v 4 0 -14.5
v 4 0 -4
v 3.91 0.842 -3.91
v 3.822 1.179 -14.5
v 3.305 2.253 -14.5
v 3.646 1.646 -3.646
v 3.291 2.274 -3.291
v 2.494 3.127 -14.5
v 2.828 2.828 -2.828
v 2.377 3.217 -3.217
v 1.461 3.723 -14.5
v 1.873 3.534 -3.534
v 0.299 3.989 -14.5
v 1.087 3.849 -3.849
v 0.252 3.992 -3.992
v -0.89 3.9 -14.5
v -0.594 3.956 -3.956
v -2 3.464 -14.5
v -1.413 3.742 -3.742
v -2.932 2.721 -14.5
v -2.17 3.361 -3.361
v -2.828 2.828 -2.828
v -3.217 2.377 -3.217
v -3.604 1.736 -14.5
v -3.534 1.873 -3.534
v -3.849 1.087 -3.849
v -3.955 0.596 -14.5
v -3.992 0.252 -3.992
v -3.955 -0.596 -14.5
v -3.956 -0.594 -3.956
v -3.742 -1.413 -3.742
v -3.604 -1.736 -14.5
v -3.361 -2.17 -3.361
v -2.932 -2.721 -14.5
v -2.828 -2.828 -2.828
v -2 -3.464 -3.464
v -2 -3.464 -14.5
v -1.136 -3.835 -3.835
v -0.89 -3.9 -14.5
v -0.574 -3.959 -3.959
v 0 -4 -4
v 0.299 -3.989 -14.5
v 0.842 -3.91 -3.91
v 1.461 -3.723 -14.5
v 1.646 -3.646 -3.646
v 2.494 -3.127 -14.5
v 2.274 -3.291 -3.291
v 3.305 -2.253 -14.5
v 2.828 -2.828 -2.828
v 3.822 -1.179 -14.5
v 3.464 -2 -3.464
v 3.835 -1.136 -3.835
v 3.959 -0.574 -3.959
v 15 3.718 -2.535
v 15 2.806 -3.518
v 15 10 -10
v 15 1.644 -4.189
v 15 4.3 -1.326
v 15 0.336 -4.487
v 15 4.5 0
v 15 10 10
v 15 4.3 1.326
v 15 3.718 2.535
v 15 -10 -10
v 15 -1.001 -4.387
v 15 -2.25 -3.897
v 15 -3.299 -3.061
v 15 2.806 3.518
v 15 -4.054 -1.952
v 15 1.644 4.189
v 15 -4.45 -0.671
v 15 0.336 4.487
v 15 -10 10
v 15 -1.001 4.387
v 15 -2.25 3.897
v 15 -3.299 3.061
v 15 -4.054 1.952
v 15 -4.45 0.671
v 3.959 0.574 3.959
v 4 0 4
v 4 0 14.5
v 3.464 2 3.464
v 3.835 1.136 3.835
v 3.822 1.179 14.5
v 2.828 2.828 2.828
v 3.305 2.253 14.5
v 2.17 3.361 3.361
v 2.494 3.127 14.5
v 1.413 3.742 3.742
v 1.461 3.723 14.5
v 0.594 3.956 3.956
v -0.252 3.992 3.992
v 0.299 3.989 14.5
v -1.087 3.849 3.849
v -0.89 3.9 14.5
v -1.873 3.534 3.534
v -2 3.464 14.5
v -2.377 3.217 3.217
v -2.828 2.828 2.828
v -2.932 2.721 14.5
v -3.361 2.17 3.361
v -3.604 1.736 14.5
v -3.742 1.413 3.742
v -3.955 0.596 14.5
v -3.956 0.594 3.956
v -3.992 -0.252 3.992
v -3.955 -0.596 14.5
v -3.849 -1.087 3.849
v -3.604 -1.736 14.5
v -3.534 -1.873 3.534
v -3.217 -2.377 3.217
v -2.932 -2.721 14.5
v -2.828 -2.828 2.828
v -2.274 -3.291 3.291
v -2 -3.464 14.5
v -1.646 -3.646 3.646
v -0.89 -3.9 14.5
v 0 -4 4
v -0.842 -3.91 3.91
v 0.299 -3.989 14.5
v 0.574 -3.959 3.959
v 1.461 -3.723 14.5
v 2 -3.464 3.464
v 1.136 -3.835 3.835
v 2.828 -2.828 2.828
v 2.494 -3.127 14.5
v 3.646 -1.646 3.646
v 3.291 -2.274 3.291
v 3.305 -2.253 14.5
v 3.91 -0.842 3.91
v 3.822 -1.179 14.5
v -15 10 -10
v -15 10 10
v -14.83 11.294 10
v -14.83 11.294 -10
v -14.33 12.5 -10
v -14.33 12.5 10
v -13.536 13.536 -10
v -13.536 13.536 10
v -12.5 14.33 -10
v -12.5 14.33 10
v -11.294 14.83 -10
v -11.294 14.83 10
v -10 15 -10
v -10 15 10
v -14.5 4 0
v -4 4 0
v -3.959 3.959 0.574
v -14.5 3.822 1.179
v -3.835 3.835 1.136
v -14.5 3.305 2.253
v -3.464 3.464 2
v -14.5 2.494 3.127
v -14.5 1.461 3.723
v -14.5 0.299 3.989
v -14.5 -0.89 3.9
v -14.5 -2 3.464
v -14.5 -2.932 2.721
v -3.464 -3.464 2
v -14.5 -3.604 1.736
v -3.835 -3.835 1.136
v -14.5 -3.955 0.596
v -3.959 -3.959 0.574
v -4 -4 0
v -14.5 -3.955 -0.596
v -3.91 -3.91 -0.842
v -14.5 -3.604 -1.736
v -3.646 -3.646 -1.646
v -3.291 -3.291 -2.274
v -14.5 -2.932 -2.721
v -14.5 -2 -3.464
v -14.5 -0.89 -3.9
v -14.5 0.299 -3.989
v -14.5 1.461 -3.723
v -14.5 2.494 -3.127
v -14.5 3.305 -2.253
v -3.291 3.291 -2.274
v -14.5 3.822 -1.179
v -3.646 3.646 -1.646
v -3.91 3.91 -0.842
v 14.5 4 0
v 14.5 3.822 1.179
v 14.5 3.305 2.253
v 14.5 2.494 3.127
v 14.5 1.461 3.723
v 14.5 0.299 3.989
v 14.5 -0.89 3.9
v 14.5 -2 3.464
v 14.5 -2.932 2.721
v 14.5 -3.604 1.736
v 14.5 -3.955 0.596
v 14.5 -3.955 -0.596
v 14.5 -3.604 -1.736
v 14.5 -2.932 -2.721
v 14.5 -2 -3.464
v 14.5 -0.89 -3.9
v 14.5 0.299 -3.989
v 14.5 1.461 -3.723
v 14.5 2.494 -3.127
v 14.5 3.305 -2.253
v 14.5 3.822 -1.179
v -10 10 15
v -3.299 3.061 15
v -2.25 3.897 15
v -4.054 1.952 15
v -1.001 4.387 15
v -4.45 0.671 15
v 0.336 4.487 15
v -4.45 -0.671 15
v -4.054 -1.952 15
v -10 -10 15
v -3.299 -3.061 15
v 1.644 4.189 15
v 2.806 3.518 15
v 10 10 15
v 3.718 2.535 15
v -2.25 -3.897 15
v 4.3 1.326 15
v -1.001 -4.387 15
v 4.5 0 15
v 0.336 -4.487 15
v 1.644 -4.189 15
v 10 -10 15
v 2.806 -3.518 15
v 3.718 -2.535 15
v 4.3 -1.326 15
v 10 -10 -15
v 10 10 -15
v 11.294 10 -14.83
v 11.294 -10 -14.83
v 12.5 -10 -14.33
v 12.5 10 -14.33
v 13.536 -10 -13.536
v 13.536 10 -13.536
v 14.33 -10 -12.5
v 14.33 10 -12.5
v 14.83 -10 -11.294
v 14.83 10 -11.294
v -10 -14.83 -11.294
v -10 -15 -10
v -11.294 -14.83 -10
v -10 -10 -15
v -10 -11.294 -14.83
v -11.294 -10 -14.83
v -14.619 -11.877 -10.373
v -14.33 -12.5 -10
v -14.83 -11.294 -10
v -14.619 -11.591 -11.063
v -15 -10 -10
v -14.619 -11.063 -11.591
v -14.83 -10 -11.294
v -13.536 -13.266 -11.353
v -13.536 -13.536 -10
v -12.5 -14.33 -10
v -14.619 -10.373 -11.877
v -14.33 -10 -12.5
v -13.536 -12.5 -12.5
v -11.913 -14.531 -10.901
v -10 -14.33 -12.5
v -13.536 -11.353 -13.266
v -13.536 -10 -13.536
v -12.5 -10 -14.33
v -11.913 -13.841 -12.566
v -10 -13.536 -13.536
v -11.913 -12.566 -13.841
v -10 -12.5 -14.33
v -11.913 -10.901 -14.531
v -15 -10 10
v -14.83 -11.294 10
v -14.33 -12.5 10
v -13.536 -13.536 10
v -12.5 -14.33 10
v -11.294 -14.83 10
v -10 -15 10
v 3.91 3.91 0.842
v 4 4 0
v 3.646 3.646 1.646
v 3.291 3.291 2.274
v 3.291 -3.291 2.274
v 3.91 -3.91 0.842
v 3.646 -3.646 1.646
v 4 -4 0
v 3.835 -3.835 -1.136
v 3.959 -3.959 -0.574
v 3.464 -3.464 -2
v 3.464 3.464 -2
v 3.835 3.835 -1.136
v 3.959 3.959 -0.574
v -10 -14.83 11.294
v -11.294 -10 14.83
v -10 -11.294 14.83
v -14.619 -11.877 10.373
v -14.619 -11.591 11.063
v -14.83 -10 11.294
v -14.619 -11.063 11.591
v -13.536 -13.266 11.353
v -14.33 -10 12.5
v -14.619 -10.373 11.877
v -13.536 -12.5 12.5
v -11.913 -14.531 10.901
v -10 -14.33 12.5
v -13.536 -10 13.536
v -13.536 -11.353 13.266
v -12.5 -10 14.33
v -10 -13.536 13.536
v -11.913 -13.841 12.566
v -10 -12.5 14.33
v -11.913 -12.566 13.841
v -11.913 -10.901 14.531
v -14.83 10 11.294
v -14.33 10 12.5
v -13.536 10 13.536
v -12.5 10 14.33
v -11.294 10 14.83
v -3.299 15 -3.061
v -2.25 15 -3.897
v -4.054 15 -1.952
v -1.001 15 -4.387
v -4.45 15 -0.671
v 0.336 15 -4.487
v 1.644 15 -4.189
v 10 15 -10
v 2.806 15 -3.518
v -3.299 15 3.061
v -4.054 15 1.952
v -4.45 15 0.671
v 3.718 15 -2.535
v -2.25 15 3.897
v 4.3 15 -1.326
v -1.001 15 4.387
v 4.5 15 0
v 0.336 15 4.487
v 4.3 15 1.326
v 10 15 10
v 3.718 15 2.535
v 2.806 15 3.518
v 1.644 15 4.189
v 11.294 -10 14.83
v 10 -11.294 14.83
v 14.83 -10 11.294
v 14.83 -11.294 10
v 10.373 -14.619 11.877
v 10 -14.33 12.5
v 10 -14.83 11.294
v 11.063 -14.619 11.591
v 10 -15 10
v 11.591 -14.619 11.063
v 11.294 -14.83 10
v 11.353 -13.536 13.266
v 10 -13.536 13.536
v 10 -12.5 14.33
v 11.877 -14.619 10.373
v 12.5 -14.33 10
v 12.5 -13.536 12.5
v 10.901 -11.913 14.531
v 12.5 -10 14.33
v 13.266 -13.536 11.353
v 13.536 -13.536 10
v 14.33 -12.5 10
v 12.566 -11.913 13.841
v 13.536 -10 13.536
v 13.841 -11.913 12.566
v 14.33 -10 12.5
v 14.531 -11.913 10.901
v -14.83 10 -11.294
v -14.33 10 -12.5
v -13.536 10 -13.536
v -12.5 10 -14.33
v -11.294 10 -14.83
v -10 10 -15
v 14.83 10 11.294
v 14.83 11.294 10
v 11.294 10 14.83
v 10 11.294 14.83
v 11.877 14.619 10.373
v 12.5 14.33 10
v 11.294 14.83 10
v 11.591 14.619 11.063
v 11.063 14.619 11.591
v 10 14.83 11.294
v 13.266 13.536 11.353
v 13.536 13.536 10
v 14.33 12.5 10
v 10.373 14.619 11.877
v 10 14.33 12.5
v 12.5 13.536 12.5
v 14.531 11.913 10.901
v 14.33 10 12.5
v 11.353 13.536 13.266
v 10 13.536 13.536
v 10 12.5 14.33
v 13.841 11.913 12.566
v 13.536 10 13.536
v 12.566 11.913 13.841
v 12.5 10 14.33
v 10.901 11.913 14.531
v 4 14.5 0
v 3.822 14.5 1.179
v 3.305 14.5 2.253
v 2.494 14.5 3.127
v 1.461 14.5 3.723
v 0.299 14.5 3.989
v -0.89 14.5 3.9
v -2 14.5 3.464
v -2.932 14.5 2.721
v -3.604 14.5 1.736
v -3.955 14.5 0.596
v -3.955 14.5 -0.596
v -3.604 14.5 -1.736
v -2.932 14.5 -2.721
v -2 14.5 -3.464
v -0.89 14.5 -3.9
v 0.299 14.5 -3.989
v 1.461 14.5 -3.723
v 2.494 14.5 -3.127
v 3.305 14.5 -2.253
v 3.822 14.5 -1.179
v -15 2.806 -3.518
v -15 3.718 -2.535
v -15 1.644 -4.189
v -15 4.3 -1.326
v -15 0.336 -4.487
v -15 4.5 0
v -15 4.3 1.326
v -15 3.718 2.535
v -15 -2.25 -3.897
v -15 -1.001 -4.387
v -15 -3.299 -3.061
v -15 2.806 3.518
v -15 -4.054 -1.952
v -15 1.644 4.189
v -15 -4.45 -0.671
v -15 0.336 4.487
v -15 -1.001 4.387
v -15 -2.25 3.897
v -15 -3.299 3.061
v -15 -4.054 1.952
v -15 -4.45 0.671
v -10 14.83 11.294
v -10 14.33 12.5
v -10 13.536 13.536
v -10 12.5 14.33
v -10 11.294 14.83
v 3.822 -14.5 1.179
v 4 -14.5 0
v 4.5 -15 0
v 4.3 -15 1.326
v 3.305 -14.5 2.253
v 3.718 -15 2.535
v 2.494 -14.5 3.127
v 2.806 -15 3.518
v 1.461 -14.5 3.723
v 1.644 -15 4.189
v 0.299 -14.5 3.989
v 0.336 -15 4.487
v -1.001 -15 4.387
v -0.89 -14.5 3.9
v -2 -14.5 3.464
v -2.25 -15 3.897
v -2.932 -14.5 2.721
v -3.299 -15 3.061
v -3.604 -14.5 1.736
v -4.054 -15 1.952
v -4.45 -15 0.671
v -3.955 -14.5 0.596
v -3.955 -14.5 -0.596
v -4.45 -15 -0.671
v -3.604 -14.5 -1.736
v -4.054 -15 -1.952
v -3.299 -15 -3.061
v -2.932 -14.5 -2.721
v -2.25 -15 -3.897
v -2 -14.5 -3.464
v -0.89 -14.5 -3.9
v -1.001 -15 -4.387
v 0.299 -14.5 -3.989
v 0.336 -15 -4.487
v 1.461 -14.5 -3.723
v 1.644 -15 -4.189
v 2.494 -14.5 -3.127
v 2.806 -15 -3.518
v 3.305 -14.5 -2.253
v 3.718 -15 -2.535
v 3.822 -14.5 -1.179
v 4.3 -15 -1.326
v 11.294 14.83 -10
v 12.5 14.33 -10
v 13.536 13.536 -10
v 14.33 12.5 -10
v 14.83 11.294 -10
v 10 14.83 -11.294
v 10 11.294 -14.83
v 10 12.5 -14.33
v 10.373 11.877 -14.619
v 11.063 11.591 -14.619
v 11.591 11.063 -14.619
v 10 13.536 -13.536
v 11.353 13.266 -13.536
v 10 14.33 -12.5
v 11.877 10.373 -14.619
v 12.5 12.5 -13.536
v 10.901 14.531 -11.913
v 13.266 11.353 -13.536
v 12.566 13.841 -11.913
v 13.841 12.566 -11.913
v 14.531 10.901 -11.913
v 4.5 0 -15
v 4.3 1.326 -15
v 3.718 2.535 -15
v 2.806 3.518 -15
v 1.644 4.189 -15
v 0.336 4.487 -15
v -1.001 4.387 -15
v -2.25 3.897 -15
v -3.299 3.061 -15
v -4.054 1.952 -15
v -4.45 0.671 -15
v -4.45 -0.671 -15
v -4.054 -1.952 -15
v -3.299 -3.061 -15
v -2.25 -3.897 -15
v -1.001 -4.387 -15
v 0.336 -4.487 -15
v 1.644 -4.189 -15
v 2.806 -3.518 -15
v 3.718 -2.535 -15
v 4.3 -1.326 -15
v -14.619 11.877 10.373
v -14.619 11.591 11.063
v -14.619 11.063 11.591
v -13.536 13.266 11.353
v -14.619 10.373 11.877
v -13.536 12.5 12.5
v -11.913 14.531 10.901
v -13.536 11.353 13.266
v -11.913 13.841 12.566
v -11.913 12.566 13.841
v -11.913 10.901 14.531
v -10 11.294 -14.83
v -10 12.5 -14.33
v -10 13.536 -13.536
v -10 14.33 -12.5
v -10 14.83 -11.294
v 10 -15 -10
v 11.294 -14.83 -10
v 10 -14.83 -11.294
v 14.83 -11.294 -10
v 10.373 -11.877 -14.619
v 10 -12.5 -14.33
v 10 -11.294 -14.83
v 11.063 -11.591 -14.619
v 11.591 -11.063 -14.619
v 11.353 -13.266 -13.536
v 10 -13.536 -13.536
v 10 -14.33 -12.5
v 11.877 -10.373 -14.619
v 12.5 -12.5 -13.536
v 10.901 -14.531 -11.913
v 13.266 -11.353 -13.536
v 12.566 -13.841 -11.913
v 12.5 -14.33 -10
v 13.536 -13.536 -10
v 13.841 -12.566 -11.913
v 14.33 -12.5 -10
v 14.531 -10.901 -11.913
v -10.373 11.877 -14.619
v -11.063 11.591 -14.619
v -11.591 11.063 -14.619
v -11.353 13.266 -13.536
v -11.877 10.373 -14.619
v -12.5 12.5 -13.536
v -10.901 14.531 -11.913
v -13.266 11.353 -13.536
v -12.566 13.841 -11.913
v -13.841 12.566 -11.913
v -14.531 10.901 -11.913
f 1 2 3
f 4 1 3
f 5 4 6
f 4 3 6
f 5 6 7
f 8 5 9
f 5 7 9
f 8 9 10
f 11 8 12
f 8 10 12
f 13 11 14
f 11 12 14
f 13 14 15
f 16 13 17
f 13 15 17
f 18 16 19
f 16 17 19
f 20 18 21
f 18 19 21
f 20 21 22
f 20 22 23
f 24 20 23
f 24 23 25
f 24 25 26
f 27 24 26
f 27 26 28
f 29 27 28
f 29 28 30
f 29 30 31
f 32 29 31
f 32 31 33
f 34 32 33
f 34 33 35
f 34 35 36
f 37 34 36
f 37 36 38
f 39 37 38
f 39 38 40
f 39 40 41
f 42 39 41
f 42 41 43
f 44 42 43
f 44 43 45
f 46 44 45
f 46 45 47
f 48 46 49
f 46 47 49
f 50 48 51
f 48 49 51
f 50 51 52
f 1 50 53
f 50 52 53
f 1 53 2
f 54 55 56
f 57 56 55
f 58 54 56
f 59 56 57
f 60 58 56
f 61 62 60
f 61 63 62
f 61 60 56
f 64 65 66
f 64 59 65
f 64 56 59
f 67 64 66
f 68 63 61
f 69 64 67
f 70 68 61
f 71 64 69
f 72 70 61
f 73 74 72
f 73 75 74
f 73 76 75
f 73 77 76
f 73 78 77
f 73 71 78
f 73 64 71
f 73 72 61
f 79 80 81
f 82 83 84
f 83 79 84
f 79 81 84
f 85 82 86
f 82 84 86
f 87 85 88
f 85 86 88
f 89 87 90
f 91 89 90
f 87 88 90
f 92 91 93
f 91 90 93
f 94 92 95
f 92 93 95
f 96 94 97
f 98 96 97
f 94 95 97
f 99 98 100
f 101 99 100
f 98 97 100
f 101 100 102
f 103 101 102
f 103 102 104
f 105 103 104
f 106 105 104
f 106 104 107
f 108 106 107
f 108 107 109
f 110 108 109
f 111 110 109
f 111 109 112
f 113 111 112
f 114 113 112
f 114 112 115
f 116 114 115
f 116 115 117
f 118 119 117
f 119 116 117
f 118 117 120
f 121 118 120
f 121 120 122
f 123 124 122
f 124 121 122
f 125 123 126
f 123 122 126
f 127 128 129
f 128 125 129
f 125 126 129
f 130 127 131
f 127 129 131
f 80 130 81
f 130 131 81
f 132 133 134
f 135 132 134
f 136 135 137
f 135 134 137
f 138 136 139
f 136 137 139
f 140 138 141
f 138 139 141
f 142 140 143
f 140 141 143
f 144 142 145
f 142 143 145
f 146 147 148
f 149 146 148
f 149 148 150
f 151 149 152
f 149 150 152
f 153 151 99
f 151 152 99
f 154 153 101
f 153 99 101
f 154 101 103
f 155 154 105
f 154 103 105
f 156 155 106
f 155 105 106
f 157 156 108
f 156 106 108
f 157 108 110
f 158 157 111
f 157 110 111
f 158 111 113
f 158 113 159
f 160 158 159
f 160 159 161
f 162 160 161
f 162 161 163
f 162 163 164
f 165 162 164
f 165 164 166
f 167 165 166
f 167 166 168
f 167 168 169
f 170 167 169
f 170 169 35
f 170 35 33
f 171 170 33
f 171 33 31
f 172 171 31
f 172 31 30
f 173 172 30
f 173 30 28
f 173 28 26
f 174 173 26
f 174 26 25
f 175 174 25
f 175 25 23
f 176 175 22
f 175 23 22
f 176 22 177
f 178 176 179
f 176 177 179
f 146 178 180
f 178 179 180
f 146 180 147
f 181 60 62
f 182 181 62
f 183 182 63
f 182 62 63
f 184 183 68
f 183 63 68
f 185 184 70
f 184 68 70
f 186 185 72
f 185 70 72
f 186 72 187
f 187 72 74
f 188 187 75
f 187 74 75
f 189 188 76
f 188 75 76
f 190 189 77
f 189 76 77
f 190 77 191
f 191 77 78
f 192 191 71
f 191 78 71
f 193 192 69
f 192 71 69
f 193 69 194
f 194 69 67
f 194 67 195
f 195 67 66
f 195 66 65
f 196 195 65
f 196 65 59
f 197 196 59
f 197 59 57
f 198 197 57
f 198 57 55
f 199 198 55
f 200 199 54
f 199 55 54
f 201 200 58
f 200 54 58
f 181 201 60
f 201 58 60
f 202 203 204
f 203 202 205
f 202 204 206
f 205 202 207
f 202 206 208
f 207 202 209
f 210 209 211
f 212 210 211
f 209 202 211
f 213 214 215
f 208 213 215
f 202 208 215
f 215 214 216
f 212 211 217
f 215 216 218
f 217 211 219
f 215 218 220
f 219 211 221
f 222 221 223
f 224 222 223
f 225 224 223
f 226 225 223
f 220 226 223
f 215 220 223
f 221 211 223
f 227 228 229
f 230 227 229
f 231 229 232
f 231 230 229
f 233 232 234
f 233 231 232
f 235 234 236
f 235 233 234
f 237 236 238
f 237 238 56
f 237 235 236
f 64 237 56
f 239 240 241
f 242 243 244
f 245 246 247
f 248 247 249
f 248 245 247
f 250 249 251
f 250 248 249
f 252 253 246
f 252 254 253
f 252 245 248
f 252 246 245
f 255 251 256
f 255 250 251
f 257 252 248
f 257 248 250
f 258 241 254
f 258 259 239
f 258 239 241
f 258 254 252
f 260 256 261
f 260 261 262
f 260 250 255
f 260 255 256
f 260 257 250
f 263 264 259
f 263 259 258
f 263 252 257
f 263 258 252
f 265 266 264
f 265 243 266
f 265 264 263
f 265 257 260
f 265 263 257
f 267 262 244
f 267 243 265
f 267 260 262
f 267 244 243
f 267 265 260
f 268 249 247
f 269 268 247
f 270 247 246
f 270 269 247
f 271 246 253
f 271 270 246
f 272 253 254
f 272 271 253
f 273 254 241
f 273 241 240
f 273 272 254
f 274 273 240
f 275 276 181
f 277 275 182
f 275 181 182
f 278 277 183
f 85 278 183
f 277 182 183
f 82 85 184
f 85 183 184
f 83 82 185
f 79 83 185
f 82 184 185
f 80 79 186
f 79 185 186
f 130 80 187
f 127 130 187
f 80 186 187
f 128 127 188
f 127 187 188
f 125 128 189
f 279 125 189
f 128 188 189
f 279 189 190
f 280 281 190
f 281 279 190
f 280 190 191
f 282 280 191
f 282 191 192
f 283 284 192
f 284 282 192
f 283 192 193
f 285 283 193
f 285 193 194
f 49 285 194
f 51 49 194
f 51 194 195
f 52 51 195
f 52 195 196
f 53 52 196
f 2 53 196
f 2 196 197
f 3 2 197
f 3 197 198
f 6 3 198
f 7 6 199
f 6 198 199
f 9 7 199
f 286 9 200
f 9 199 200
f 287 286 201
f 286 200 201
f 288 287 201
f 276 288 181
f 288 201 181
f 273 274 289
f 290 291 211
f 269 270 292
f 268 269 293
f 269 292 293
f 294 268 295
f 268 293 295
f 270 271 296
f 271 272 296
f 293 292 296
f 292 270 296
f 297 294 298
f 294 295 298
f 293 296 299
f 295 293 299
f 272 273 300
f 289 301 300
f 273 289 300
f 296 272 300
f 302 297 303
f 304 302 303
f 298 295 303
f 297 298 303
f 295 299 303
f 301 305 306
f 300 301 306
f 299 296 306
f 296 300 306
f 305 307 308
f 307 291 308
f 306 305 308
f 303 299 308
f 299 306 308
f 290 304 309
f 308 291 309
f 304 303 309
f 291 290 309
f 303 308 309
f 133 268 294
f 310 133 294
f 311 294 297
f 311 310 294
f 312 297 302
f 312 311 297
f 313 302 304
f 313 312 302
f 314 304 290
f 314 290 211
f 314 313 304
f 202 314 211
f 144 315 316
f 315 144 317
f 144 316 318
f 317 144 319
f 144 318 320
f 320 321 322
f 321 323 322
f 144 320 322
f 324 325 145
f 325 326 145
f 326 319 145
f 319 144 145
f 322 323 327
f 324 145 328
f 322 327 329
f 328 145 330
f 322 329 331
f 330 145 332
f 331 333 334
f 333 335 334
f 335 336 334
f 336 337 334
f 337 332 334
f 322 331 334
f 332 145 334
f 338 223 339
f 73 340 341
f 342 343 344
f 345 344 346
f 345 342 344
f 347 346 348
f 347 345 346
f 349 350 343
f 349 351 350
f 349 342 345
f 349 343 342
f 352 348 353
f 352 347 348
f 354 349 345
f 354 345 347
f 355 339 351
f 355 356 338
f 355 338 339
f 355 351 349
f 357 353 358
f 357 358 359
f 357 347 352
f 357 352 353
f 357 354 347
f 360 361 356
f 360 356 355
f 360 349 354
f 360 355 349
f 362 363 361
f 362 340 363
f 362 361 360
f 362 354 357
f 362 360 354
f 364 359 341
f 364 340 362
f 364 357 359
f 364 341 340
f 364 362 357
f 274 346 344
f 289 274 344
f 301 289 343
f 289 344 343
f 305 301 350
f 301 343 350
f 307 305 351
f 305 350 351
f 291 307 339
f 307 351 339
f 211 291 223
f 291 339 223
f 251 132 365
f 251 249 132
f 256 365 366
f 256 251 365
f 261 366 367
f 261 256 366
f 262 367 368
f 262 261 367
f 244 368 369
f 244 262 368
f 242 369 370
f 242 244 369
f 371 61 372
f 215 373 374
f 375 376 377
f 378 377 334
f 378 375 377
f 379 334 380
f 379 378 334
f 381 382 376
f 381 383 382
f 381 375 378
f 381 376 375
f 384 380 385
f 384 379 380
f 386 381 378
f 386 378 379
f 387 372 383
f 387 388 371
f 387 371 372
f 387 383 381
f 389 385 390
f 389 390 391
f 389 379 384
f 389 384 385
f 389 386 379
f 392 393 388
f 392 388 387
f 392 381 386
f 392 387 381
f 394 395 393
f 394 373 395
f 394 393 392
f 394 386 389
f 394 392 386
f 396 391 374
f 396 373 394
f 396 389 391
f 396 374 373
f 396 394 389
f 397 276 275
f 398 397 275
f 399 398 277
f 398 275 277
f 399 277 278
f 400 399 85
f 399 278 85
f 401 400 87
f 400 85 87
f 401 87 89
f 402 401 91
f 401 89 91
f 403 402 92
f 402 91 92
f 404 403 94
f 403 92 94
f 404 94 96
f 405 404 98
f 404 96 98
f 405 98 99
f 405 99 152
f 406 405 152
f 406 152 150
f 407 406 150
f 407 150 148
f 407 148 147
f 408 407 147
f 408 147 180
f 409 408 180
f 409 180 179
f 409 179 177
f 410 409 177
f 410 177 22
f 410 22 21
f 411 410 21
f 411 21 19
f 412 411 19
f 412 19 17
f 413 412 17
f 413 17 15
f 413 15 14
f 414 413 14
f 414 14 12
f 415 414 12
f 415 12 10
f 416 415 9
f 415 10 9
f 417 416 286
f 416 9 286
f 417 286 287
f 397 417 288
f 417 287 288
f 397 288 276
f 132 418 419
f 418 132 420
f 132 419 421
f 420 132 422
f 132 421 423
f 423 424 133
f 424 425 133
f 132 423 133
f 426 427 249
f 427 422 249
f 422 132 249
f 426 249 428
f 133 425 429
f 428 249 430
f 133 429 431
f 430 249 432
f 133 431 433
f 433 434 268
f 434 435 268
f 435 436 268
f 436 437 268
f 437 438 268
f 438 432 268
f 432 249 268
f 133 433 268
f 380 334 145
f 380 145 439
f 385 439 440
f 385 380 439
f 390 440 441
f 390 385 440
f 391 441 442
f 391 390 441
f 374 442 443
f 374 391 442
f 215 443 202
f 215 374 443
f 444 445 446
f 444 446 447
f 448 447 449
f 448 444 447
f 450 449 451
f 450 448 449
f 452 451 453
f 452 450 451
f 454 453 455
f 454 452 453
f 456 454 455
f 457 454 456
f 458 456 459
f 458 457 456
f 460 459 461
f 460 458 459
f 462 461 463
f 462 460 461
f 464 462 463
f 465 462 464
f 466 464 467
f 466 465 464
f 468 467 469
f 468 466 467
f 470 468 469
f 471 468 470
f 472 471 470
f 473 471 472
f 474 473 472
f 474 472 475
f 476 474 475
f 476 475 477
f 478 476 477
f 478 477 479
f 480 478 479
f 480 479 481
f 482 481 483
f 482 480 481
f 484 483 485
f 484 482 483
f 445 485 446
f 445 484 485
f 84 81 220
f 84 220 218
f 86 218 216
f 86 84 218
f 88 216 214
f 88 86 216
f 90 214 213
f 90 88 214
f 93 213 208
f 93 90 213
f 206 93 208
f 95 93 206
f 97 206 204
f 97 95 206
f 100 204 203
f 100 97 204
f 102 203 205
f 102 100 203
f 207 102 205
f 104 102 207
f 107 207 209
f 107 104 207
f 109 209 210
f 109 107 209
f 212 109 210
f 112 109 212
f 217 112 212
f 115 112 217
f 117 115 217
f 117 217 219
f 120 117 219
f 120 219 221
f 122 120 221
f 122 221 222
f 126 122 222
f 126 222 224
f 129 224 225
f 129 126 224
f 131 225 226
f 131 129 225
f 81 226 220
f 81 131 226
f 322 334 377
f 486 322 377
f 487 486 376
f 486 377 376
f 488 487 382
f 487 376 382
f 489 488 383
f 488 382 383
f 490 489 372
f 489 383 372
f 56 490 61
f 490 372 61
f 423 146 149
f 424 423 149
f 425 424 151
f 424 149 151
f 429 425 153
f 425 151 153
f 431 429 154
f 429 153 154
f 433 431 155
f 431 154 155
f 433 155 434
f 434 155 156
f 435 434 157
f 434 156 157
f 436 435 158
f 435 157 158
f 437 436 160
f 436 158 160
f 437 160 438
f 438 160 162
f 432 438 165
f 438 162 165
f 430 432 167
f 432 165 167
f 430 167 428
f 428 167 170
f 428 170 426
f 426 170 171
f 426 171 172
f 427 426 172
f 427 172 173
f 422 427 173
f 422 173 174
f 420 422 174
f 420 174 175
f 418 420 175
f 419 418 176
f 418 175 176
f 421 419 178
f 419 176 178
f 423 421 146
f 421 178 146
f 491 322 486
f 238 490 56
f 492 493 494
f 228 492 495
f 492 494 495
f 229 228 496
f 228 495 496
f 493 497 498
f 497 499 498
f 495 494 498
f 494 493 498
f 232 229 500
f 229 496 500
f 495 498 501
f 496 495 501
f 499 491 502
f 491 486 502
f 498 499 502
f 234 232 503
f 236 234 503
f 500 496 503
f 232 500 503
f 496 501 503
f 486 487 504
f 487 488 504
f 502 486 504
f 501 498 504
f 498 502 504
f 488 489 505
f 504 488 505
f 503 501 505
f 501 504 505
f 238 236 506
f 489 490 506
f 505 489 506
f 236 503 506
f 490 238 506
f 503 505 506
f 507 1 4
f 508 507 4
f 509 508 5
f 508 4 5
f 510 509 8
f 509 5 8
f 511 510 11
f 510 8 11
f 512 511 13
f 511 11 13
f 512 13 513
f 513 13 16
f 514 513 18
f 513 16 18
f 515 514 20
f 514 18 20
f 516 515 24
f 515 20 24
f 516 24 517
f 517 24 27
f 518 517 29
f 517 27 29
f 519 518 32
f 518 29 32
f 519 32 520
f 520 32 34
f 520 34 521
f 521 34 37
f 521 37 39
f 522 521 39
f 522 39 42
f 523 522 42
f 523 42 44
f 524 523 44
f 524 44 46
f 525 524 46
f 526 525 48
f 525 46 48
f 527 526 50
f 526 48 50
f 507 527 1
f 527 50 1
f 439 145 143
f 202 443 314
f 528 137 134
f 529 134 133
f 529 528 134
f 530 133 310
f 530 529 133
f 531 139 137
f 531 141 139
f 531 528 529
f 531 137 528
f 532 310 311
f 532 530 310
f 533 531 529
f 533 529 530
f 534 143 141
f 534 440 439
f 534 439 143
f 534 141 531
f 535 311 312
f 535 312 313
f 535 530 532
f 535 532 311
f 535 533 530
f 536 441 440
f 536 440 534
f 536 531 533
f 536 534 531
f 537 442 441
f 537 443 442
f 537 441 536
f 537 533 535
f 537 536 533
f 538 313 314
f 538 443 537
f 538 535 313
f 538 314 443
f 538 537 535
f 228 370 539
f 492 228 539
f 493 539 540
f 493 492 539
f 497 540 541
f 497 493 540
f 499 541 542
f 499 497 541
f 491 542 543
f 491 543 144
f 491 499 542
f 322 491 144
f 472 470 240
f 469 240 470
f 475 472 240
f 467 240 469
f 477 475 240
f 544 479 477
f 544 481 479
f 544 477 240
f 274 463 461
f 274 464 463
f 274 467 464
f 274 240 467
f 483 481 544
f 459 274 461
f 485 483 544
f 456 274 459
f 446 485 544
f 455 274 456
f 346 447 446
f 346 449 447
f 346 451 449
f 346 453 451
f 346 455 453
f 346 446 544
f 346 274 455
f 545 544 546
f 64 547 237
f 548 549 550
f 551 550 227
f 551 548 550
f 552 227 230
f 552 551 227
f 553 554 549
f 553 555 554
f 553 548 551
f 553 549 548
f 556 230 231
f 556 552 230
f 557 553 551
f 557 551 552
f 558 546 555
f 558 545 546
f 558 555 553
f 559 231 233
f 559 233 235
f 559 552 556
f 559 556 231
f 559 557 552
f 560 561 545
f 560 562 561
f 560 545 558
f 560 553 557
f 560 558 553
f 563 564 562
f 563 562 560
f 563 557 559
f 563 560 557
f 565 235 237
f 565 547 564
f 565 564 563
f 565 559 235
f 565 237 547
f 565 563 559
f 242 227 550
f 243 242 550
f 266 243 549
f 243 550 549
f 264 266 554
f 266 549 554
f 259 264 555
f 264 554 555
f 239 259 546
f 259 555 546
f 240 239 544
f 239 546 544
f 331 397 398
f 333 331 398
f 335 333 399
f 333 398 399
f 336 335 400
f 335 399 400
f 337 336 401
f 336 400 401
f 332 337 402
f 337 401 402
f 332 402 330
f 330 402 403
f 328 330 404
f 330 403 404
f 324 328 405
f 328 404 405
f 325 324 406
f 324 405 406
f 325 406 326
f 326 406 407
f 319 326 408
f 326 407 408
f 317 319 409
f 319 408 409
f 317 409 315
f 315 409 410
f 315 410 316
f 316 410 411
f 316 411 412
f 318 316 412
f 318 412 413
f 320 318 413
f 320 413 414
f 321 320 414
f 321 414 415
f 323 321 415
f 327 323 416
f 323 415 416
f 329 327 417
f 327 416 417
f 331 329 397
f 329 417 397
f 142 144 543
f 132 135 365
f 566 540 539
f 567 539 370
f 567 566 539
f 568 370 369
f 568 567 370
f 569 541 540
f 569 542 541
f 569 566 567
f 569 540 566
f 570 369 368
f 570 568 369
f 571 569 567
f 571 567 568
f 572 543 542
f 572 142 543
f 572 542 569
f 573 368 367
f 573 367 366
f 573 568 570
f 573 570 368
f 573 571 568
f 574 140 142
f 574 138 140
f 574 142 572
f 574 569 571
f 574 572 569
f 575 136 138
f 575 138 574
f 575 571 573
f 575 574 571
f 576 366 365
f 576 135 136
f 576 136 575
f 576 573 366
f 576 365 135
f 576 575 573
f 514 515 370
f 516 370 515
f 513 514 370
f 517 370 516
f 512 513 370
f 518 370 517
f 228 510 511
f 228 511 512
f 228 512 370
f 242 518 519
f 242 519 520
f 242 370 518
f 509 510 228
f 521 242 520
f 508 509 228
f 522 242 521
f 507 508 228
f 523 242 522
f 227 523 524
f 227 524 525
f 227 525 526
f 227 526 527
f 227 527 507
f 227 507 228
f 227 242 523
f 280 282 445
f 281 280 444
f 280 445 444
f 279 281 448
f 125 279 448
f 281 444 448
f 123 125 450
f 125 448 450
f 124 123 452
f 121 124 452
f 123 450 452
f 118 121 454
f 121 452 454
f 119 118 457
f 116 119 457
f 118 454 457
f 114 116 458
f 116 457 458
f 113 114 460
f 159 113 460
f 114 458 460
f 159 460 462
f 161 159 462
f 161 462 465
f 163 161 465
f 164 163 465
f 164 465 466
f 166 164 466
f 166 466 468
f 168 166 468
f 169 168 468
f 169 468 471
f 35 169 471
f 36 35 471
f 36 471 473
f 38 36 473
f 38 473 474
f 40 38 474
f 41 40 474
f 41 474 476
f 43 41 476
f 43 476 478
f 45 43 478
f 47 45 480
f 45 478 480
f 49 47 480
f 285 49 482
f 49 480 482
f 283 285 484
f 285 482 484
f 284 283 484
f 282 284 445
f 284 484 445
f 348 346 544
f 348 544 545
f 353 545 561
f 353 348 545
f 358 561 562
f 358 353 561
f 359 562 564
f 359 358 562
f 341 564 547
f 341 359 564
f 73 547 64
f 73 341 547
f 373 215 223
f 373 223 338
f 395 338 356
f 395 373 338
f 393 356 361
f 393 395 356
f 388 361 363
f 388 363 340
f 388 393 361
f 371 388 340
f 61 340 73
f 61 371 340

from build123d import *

# Parameters (mm, degrees)
F0_W     = 30
F0_H     = 30
F1_DEPTH = 15
F2_R     = 4
F3_DEPTH = 30.001
F4_R     = 4
F5_DEPTH = 30.001
F6_R     = 4
F7_DEPTH = 30.001
F8_R     = 5
F9_SIZE  = 0.5


with BuildPart() as f1:
    # F0 (on Front) → F1 (new body, symmetric)
    with BuildSketch(Plane.XZ):
        Rectangle(F0_W, F0_H)
    extrude(amount=F1_DEPTH, both=True)

    # F2 (on face) → F3 (cut, through all)
    with BuildSketch(Plane.XZ.offset(15)):
        Circle(F2_R)
    extrude(amount=-F3_DEPTH, mode=Mode.SUBTRACT)

    # F4 (on face) → F5 (cut, through all)
    with BuildSketch(Plane.YZ.offset(15)):
        Circle(F4_R)
    extrude(amount=-F5_DEPTH, mode=Mode.SUBTRACT)

    # F6 (on face) → F7 (cut, through all)
    with BuildSketch(Plane.XY.offset(15)):
        Circle(F6_R)
    extrude(amount=-F7_DEPTH, mode=Mode.SUBTRACT)

    # F8
    f8_edges = [f1.edges().sort_by_distance(p)[0] for p in [
        (15, 0, 15),
        (0, -15, 15),
        (15, -15, 0),
        (0, -15, -15),
        (-15, -15, 0),
        (15, 15, 0),
        (0, 15, 15),
        (-15, 15, 0),
        (0, 15, -15),
        (-15, 0, 15),
        (-15, 0, -15),
        (15, 0, -15),
    ]]
    fillet(f8_edges, radius=F8_R)

    # F9
    f9_edges = [f1.edges().sort_by_distance(p)[0] for p in [
        (-4, 0, 15),
        (-4, -15, 0),
        (15, -4, 0),
        (-4, 15, 0),
        (-15, -4, 0),
        (-4, 0, -15),
    ]]
    chamfer(f9_edges, length=F9_SIZE)


solid = f1.part
